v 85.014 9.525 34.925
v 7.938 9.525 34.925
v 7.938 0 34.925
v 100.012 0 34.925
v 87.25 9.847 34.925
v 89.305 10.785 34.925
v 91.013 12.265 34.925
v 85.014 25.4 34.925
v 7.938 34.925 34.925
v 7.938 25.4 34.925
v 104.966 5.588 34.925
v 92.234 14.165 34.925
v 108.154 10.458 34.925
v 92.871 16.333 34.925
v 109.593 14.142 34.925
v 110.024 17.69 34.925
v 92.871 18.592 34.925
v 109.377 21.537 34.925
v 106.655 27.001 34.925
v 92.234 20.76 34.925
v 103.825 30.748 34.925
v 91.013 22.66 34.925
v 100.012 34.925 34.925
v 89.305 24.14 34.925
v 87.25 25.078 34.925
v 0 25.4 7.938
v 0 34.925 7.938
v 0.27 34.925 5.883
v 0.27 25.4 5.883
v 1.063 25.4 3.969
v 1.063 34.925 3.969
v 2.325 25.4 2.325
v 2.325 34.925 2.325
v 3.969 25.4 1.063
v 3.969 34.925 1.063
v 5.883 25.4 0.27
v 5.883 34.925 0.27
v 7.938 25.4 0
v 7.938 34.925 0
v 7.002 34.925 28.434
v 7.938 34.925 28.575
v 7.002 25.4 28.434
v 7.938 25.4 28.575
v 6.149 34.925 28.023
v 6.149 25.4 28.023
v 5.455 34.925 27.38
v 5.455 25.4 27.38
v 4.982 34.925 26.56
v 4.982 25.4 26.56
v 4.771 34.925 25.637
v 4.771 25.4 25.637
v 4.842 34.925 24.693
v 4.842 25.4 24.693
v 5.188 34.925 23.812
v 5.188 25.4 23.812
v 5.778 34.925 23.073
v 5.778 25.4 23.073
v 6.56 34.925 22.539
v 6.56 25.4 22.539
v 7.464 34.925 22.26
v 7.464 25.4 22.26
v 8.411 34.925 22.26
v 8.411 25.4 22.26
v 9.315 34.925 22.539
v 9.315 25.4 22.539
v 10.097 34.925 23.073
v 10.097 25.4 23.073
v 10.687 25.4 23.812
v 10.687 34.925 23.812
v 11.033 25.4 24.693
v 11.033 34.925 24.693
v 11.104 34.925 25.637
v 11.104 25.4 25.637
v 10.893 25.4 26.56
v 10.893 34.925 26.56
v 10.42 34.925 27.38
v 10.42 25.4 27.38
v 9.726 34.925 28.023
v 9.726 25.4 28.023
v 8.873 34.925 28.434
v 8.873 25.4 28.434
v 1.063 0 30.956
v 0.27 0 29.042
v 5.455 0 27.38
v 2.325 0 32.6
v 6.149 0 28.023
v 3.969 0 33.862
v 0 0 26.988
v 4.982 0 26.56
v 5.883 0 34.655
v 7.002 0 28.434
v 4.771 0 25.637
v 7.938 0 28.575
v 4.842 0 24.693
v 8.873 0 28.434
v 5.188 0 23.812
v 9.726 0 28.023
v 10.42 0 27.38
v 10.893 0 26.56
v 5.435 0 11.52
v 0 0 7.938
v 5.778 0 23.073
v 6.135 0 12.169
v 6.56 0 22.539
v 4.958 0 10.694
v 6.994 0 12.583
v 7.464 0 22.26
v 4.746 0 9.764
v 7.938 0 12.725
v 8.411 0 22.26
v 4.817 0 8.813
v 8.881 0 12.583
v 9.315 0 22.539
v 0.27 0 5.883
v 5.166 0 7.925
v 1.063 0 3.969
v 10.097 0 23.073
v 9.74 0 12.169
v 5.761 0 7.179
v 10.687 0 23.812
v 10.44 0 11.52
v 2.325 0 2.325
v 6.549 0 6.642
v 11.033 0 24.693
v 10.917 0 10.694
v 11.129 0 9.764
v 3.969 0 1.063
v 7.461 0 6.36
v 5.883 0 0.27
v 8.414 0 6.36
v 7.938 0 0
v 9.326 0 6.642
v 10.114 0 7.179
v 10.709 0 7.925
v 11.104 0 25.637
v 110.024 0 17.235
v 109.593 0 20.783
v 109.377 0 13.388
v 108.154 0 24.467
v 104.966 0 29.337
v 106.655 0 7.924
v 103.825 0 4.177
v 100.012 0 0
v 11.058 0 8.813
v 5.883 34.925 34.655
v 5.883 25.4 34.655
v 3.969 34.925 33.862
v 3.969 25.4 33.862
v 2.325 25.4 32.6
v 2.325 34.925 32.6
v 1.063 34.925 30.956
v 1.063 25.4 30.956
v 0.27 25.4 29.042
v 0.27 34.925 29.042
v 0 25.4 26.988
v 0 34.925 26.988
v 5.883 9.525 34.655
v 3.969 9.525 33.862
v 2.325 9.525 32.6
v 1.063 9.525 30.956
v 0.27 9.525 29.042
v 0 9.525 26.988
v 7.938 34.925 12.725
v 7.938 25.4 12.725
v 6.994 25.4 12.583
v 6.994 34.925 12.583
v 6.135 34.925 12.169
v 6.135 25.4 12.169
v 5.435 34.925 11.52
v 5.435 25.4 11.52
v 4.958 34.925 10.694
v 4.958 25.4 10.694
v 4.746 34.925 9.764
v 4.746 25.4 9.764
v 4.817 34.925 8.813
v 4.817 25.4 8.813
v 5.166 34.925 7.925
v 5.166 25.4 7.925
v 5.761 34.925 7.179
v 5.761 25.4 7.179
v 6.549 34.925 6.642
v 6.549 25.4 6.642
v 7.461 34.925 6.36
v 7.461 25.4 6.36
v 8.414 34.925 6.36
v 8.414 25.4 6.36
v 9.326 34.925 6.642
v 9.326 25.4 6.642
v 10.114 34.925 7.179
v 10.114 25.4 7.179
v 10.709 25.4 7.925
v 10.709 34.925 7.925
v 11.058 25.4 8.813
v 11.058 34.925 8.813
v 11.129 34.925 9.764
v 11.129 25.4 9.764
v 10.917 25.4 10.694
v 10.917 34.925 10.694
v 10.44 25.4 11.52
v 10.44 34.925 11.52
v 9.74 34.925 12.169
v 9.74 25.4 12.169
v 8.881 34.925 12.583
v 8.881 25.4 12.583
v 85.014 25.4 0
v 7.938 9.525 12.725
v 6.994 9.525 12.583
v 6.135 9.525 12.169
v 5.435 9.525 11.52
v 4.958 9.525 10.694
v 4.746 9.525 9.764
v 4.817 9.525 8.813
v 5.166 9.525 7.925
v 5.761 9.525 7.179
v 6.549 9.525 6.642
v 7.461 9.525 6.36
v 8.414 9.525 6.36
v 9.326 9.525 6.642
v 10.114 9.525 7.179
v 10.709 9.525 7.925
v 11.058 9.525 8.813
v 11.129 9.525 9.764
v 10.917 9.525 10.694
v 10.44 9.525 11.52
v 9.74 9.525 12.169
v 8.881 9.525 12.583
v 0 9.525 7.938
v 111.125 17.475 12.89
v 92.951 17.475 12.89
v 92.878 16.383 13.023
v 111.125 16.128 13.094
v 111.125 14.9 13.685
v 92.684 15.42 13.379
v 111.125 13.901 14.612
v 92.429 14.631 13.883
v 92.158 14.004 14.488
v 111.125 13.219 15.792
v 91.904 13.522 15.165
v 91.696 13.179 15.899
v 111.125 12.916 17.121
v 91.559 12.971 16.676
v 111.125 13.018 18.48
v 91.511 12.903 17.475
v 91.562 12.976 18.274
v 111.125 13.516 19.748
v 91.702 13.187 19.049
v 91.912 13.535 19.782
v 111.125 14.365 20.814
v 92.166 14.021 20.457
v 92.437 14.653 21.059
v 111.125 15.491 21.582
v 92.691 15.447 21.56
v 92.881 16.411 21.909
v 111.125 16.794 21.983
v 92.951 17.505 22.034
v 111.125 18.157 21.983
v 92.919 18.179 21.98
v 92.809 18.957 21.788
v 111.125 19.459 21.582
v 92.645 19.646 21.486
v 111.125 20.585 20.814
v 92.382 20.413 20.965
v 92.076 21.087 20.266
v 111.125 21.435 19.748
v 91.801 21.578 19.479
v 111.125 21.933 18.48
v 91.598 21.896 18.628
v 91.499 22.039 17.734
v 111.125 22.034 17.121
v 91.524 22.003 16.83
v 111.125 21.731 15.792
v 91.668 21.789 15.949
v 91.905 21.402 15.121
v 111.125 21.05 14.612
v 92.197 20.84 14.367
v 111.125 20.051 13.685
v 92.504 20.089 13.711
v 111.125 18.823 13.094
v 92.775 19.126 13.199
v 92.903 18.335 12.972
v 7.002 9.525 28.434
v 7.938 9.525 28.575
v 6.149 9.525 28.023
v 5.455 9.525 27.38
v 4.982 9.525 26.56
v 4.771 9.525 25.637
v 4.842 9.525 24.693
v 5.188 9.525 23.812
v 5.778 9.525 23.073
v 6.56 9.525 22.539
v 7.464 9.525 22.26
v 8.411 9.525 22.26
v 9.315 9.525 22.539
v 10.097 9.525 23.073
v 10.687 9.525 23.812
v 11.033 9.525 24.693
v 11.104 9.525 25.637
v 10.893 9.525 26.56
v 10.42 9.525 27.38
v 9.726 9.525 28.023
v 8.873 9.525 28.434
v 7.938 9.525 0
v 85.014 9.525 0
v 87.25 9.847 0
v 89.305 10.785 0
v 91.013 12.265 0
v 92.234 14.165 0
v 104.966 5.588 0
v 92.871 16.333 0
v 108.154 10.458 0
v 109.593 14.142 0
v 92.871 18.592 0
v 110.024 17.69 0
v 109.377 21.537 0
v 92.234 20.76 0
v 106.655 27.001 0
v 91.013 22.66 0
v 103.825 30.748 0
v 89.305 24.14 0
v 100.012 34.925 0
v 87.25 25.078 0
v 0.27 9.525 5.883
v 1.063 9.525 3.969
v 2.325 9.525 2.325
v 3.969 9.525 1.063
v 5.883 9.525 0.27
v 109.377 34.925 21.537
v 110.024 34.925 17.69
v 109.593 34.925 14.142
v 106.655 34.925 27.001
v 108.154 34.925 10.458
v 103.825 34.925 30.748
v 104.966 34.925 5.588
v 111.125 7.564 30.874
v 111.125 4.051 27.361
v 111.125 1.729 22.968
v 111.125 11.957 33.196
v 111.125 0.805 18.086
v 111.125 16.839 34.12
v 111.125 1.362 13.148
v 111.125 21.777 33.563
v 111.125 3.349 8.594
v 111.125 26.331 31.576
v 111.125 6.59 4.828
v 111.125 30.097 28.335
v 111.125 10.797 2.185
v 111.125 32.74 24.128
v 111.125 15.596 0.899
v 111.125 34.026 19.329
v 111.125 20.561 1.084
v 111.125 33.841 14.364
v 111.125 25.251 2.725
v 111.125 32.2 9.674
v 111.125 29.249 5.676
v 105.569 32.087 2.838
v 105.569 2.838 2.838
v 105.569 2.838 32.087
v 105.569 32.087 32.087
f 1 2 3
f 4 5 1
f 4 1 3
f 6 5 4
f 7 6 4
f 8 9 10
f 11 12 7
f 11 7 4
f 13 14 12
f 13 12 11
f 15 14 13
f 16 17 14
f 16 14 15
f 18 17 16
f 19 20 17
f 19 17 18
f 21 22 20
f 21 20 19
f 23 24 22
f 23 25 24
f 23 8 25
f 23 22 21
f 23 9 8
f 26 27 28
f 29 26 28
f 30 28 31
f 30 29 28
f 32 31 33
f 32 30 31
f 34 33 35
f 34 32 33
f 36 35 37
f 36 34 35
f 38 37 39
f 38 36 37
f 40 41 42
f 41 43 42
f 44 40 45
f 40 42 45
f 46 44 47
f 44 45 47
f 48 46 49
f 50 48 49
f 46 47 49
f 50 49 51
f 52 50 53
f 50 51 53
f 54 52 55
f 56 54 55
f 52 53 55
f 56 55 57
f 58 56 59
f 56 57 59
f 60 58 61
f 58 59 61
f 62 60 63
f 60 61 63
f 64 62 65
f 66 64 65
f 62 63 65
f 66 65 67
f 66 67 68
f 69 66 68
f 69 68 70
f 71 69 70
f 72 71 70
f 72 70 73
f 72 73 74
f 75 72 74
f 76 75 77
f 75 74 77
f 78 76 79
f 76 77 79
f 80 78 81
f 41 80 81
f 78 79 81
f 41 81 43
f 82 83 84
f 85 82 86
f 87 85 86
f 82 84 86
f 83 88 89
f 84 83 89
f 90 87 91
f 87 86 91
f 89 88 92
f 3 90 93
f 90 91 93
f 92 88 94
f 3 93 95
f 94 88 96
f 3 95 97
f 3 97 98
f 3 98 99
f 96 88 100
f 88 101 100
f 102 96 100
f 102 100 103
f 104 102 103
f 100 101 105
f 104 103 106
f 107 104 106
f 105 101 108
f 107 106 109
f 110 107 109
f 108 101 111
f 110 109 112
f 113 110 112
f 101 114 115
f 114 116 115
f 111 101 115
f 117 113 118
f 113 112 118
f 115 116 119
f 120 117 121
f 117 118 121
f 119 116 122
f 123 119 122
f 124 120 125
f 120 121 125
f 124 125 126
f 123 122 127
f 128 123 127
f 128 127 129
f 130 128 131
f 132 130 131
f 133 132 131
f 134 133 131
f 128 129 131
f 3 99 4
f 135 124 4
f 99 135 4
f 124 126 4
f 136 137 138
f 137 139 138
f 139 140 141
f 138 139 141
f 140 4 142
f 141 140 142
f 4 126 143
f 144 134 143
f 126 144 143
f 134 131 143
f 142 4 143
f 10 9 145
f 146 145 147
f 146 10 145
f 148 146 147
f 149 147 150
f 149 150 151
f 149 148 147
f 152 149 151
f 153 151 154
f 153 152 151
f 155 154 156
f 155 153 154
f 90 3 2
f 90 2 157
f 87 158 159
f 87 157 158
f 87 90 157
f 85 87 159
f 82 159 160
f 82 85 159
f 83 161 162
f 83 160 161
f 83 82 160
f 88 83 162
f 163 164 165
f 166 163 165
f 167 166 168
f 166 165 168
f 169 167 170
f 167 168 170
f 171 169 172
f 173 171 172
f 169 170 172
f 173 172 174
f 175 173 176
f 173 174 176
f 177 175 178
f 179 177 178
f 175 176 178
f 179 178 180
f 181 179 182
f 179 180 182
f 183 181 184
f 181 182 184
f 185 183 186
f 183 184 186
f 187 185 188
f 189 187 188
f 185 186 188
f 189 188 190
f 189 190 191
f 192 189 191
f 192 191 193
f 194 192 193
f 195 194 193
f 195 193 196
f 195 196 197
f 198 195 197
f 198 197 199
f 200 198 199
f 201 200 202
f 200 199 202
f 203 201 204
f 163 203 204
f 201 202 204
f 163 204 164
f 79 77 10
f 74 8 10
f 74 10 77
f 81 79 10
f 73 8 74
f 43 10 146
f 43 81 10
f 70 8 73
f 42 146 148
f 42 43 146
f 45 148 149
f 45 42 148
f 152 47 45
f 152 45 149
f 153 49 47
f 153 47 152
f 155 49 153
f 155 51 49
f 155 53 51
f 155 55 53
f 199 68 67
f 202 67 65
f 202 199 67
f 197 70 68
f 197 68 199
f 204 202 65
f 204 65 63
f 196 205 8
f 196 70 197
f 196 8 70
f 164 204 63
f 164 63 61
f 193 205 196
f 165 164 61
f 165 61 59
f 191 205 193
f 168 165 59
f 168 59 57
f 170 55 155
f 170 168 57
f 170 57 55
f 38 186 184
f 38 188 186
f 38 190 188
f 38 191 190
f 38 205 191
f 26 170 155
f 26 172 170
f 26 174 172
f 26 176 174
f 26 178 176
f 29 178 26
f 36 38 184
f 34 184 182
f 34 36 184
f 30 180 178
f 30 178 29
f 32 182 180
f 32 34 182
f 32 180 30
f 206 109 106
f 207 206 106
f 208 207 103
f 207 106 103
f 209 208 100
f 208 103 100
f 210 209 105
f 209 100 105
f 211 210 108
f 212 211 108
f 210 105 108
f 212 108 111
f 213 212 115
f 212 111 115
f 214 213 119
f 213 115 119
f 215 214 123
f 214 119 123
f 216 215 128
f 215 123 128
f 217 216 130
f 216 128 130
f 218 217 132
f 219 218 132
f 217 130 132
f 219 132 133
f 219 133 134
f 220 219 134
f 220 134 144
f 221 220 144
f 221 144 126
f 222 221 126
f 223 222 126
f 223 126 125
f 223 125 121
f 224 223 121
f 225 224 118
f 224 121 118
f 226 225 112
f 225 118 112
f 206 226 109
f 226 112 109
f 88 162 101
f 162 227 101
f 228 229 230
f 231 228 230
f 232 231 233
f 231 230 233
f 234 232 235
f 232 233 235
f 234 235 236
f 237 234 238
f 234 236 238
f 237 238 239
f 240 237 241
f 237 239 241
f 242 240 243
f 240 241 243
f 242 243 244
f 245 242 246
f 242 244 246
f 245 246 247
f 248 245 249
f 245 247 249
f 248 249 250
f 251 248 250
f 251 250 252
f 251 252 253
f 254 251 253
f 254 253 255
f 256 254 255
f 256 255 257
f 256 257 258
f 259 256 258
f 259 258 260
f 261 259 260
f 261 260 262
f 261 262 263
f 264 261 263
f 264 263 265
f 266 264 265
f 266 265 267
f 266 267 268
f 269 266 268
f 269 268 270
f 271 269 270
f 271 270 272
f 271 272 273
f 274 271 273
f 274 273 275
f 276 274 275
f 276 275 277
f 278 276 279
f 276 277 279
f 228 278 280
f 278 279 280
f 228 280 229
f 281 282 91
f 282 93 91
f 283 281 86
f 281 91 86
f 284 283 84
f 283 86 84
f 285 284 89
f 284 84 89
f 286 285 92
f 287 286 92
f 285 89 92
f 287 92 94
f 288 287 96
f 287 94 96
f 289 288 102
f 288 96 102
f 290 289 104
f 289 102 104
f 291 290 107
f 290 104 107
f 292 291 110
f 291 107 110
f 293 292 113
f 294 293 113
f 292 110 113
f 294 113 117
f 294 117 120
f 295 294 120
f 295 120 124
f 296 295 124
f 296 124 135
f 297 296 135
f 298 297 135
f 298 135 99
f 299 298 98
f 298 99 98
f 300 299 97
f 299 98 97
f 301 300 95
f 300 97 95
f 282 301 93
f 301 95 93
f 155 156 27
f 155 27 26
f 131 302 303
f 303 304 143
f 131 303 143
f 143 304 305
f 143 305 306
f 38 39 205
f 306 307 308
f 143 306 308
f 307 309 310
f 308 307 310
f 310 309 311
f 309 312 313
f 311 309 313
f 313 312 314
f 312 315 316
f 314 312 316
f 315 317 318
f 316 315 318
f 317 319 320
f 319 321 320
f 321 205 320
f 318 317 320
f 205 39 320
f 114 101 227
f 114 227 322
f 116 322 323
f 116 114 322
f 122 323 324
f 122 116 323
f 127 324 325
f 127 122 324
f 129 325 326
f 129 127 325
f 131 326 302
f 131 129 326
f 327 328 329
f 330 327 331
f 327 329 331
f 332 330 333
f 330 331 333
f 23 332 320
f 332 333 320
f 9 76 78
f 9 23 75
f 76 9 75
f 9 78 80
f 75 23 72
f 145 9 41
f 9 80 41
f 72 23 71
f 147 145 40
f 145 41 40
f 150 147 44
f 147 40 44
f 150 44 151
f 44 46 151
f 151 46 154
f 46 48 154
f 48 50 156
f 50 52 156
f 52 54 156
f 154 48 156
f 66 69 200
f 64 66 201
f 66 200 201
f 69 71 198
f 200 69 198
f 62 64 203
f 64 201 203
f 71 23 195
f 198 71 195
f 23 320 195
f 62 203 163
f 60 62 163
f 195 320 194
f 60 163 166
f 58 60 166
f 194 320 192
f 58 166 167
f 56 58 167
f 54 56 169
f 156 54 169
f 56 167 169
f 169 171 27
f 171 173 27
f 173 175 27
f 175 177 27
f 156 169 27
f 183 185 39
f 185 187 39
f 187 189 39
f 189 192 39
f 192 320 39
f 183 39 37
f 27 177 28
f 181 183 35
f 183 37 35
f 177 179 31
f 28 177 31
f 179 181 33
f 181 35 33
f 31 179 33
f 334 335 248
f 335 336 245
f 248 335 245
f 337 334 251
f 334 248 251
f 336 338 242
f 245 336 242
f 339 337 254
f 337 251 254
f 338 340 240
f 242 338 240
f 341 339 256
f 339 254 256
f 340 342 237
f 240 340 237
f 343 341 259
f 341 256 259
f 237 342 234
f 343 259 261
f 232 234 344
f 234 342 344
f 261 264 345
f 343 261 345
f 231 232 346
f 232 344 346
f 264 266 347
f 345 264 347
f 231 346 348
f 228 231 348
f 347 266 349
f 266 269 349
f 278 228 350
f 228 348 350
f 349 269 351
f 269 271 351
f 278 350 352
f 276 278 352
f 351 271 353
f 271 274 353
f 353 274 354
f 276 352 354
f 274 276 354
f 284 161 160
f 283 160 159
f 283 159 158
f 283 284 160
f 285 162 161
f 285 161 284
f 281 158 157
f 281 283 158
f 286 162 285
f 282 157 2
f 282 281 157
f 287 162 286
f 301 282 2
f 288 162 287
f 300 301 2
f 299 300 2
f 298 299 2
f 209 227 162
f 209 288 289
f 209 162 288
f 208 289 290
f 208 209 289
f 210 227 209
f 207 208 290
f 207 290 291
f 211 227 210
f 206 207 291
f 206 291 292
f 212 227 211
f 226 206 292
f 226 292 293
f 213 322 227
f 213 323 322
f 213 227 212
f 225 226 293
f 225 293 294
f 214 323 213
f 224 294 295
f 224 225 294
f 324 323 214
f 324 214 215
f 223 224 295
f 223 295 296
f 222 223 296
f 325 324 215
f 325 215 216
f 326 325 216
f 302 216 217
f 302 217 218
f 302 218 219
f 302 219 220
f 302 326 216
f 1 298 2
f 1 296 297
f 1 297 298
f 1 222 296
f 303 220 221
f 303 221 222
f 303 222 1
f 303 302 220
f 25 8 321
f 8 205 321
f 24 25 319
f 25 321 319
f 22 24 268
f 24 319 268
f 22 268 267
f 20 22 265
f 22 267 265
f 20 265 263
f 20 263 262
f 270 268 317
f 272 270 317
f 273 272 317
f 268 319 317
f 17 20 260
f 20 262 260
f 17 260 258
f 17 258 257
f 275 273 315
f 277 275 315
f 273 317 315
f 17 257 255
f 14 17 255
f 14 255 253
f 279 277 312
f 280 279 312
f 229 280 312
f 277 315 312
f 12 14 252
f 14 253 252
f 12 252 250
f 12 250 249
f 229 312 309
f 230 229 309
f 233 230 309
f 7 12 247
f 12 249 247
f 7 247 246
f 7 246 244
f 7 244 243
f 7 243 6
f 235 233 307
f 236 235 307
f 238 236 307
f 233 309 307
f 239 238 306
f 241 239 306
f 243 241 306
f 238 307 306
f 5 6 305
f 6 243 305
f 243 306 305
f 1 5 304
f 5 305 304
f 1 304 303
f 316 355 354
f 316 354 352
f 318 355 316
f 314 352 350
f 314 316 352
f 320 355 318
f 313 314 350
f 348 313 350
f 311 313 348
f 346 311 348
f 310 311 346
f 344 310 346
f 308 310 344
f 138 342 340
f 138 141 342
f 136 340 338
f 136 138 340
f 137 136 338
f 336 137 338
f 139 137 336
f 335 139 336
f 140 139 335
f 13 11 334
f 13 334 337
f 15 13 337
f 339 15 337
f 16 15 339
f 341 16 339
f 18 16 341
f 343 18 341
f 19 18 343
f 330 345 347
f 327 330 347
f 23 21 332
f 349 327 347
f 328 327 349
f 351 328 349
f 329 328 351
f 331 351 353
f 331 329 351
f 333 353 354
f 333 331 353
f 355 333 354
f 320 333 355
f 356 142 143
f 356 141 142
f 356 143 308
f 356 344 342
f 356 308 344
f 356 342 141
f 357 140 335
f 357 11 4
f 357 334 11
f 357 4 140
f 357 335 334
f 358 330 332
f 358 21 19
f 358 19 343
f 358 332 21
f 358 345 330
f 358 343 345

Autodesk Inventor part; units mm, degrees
ref_plane "YZ Plane" through (0, 0, 0) normal (1, 0, 0) x (0, 1, 0)
ref_plane "XZ Plane" through (0, 0, 0) normal (0, 1, 0) x (-1, 0, 0)
sketch "Sketch1" plane through (0, 0, 0) normal (0, 0, 1) x (1, 0, 0)
  line L0 (0, 0) -> (111.125, 0)
  line L1 (111.125, 0) -> (111.125, 34.925)
  line L2 (111.125, 34.925) -> (0, 34.925)
  arc A0 (85.0138, 9.525) -> (85.0138, 25.4) centre (85.0138, 17.4625) ccw
  line L3 (85.0138, 25.4) -> (0, 25.4)
  line L4 (0, 9.525) -> (85.0138, 9.525)
  line L5 (85.0138, 9.525) -> (85.0138, 25.4)
  line L6 (0, 34.925) -> (0, 25.4)
  line L7 (0, 9.525) -> (0, 0)
  dimension "d0" = 34.925
  dimension "d2" = 15.875
  dimension "d3" = 85.0138
  dimension "d4" = 111.125
extrude "Extrusion1" add sketch "Sketch1" along normal blind 34.925 contours L7 L4 A0 L3 L6 L2 L1 L0
sketch "Sketch2" plane through (111.125, 0, 0) normal (1, 0, 0) x (0, 0, -1)
  point P0 (0, 0)
  point P1 (-17.4625, 17.4752)
hole "Hole1" at (111.125, 17.4752, 17.4625) direction (-1, 0, 0) diameter 9.144 end through all thread size "7/16-14 UNC" class "2B" standard "ANSI Unified Screw Threads"
ref_plane "Work Plane1" through (111.125, 34.925, 0) normal (0, 0.7071, 0.7071) x (-1, 0, 0)
sketch "Sketch3" plane through (111.125, 34.925, 0) normal (0, 0.7071, 0.7071) x (-1, 0, 0)
  line L0 (0, 0) -> (111.125, 0) projected
  line L1 (111.125, 0) -> (111.125, 24.6957) projected
  line L2 (0, 24.6957) -> (111.125, 24.6957) projected
  line L3 (0, 0) -> (0, 24.6957) projected
  line L4 (0, 0) -> (0, 24.6957) projected
  line L5 (0, 8.027) -> (11.1125, 0)
  line L6 (11.1125, 0) -> (0, 0)
  line L7 (0, 8.027) -> (0, 0)
  dimension "d14" = 11.1125
  dimension "d15" = 16.6687
revolve "Revolution1" cut sketch "Sketch3" angle 360 about axis through (111.125, 17.4625, 17.4625) along (-1, 0, 0) contours L3 L5 L0
fillet "Fillet1" radius 7.9375 4 edges at (0, 30.1625, 0) (0, 4.7625, 0) (0, 4.7625, 34.925) (0, 30.1625, 34.925)
sketch "Sketch4" plane through (7.9375, 0, 0) normal (0, -1, 0) x (1, 0, 0)
  point P0 (-7.9375, 0)
  point P1 (0, 9.525)
  point P2 (0, 25.4)
sketch "Sketch5" plane through (7.9375, 34.925, 0) normal (0, 1, 0) x (1, 0, 0)
  line L0 (92.075, -34.925) -> (0, -34.925) projected
  line L1 (92.075, 0) -> (0, 0) projected
  point P0 (-7.9375, 0)
  dimension "d18" = 34.925
sketch "Sketch6" plane through (7.9375, 34.925, 0) normal (0, 1, 0) x (1, 0, 0)
  point P0 (-7.9375, 0)
  point P1 (0, -9.525)
  point P2 (0, -25.4)
hole "Hole2" at (7.9375, 34.925, 9.525) direction (0, -1, 0) diameter 6.4008 depth 83.2612 tip angle 118 thread size "5/16-18 UNC" class "2B" standard "ANSI Unified Screw Threads"
thread "Thread1" size "5/16-18 UNC" class "2B" standard "ANSI Unified Screw Threads" full length
sketch "Sketch7" plane through (7.9375, 34.925, 0) normal (0, 1, 0) x (1, 0, 0)
  point P0 (-7.9375, 0)
  point P1 (0, -25.4)
hole "Hole3" at (7.9375, 34.925, 25.4) direction (0, -1, 0) diameter 6.35 end through all
properties part number "middle handle piece (hard) (1)" material "Aluminum 6061"
